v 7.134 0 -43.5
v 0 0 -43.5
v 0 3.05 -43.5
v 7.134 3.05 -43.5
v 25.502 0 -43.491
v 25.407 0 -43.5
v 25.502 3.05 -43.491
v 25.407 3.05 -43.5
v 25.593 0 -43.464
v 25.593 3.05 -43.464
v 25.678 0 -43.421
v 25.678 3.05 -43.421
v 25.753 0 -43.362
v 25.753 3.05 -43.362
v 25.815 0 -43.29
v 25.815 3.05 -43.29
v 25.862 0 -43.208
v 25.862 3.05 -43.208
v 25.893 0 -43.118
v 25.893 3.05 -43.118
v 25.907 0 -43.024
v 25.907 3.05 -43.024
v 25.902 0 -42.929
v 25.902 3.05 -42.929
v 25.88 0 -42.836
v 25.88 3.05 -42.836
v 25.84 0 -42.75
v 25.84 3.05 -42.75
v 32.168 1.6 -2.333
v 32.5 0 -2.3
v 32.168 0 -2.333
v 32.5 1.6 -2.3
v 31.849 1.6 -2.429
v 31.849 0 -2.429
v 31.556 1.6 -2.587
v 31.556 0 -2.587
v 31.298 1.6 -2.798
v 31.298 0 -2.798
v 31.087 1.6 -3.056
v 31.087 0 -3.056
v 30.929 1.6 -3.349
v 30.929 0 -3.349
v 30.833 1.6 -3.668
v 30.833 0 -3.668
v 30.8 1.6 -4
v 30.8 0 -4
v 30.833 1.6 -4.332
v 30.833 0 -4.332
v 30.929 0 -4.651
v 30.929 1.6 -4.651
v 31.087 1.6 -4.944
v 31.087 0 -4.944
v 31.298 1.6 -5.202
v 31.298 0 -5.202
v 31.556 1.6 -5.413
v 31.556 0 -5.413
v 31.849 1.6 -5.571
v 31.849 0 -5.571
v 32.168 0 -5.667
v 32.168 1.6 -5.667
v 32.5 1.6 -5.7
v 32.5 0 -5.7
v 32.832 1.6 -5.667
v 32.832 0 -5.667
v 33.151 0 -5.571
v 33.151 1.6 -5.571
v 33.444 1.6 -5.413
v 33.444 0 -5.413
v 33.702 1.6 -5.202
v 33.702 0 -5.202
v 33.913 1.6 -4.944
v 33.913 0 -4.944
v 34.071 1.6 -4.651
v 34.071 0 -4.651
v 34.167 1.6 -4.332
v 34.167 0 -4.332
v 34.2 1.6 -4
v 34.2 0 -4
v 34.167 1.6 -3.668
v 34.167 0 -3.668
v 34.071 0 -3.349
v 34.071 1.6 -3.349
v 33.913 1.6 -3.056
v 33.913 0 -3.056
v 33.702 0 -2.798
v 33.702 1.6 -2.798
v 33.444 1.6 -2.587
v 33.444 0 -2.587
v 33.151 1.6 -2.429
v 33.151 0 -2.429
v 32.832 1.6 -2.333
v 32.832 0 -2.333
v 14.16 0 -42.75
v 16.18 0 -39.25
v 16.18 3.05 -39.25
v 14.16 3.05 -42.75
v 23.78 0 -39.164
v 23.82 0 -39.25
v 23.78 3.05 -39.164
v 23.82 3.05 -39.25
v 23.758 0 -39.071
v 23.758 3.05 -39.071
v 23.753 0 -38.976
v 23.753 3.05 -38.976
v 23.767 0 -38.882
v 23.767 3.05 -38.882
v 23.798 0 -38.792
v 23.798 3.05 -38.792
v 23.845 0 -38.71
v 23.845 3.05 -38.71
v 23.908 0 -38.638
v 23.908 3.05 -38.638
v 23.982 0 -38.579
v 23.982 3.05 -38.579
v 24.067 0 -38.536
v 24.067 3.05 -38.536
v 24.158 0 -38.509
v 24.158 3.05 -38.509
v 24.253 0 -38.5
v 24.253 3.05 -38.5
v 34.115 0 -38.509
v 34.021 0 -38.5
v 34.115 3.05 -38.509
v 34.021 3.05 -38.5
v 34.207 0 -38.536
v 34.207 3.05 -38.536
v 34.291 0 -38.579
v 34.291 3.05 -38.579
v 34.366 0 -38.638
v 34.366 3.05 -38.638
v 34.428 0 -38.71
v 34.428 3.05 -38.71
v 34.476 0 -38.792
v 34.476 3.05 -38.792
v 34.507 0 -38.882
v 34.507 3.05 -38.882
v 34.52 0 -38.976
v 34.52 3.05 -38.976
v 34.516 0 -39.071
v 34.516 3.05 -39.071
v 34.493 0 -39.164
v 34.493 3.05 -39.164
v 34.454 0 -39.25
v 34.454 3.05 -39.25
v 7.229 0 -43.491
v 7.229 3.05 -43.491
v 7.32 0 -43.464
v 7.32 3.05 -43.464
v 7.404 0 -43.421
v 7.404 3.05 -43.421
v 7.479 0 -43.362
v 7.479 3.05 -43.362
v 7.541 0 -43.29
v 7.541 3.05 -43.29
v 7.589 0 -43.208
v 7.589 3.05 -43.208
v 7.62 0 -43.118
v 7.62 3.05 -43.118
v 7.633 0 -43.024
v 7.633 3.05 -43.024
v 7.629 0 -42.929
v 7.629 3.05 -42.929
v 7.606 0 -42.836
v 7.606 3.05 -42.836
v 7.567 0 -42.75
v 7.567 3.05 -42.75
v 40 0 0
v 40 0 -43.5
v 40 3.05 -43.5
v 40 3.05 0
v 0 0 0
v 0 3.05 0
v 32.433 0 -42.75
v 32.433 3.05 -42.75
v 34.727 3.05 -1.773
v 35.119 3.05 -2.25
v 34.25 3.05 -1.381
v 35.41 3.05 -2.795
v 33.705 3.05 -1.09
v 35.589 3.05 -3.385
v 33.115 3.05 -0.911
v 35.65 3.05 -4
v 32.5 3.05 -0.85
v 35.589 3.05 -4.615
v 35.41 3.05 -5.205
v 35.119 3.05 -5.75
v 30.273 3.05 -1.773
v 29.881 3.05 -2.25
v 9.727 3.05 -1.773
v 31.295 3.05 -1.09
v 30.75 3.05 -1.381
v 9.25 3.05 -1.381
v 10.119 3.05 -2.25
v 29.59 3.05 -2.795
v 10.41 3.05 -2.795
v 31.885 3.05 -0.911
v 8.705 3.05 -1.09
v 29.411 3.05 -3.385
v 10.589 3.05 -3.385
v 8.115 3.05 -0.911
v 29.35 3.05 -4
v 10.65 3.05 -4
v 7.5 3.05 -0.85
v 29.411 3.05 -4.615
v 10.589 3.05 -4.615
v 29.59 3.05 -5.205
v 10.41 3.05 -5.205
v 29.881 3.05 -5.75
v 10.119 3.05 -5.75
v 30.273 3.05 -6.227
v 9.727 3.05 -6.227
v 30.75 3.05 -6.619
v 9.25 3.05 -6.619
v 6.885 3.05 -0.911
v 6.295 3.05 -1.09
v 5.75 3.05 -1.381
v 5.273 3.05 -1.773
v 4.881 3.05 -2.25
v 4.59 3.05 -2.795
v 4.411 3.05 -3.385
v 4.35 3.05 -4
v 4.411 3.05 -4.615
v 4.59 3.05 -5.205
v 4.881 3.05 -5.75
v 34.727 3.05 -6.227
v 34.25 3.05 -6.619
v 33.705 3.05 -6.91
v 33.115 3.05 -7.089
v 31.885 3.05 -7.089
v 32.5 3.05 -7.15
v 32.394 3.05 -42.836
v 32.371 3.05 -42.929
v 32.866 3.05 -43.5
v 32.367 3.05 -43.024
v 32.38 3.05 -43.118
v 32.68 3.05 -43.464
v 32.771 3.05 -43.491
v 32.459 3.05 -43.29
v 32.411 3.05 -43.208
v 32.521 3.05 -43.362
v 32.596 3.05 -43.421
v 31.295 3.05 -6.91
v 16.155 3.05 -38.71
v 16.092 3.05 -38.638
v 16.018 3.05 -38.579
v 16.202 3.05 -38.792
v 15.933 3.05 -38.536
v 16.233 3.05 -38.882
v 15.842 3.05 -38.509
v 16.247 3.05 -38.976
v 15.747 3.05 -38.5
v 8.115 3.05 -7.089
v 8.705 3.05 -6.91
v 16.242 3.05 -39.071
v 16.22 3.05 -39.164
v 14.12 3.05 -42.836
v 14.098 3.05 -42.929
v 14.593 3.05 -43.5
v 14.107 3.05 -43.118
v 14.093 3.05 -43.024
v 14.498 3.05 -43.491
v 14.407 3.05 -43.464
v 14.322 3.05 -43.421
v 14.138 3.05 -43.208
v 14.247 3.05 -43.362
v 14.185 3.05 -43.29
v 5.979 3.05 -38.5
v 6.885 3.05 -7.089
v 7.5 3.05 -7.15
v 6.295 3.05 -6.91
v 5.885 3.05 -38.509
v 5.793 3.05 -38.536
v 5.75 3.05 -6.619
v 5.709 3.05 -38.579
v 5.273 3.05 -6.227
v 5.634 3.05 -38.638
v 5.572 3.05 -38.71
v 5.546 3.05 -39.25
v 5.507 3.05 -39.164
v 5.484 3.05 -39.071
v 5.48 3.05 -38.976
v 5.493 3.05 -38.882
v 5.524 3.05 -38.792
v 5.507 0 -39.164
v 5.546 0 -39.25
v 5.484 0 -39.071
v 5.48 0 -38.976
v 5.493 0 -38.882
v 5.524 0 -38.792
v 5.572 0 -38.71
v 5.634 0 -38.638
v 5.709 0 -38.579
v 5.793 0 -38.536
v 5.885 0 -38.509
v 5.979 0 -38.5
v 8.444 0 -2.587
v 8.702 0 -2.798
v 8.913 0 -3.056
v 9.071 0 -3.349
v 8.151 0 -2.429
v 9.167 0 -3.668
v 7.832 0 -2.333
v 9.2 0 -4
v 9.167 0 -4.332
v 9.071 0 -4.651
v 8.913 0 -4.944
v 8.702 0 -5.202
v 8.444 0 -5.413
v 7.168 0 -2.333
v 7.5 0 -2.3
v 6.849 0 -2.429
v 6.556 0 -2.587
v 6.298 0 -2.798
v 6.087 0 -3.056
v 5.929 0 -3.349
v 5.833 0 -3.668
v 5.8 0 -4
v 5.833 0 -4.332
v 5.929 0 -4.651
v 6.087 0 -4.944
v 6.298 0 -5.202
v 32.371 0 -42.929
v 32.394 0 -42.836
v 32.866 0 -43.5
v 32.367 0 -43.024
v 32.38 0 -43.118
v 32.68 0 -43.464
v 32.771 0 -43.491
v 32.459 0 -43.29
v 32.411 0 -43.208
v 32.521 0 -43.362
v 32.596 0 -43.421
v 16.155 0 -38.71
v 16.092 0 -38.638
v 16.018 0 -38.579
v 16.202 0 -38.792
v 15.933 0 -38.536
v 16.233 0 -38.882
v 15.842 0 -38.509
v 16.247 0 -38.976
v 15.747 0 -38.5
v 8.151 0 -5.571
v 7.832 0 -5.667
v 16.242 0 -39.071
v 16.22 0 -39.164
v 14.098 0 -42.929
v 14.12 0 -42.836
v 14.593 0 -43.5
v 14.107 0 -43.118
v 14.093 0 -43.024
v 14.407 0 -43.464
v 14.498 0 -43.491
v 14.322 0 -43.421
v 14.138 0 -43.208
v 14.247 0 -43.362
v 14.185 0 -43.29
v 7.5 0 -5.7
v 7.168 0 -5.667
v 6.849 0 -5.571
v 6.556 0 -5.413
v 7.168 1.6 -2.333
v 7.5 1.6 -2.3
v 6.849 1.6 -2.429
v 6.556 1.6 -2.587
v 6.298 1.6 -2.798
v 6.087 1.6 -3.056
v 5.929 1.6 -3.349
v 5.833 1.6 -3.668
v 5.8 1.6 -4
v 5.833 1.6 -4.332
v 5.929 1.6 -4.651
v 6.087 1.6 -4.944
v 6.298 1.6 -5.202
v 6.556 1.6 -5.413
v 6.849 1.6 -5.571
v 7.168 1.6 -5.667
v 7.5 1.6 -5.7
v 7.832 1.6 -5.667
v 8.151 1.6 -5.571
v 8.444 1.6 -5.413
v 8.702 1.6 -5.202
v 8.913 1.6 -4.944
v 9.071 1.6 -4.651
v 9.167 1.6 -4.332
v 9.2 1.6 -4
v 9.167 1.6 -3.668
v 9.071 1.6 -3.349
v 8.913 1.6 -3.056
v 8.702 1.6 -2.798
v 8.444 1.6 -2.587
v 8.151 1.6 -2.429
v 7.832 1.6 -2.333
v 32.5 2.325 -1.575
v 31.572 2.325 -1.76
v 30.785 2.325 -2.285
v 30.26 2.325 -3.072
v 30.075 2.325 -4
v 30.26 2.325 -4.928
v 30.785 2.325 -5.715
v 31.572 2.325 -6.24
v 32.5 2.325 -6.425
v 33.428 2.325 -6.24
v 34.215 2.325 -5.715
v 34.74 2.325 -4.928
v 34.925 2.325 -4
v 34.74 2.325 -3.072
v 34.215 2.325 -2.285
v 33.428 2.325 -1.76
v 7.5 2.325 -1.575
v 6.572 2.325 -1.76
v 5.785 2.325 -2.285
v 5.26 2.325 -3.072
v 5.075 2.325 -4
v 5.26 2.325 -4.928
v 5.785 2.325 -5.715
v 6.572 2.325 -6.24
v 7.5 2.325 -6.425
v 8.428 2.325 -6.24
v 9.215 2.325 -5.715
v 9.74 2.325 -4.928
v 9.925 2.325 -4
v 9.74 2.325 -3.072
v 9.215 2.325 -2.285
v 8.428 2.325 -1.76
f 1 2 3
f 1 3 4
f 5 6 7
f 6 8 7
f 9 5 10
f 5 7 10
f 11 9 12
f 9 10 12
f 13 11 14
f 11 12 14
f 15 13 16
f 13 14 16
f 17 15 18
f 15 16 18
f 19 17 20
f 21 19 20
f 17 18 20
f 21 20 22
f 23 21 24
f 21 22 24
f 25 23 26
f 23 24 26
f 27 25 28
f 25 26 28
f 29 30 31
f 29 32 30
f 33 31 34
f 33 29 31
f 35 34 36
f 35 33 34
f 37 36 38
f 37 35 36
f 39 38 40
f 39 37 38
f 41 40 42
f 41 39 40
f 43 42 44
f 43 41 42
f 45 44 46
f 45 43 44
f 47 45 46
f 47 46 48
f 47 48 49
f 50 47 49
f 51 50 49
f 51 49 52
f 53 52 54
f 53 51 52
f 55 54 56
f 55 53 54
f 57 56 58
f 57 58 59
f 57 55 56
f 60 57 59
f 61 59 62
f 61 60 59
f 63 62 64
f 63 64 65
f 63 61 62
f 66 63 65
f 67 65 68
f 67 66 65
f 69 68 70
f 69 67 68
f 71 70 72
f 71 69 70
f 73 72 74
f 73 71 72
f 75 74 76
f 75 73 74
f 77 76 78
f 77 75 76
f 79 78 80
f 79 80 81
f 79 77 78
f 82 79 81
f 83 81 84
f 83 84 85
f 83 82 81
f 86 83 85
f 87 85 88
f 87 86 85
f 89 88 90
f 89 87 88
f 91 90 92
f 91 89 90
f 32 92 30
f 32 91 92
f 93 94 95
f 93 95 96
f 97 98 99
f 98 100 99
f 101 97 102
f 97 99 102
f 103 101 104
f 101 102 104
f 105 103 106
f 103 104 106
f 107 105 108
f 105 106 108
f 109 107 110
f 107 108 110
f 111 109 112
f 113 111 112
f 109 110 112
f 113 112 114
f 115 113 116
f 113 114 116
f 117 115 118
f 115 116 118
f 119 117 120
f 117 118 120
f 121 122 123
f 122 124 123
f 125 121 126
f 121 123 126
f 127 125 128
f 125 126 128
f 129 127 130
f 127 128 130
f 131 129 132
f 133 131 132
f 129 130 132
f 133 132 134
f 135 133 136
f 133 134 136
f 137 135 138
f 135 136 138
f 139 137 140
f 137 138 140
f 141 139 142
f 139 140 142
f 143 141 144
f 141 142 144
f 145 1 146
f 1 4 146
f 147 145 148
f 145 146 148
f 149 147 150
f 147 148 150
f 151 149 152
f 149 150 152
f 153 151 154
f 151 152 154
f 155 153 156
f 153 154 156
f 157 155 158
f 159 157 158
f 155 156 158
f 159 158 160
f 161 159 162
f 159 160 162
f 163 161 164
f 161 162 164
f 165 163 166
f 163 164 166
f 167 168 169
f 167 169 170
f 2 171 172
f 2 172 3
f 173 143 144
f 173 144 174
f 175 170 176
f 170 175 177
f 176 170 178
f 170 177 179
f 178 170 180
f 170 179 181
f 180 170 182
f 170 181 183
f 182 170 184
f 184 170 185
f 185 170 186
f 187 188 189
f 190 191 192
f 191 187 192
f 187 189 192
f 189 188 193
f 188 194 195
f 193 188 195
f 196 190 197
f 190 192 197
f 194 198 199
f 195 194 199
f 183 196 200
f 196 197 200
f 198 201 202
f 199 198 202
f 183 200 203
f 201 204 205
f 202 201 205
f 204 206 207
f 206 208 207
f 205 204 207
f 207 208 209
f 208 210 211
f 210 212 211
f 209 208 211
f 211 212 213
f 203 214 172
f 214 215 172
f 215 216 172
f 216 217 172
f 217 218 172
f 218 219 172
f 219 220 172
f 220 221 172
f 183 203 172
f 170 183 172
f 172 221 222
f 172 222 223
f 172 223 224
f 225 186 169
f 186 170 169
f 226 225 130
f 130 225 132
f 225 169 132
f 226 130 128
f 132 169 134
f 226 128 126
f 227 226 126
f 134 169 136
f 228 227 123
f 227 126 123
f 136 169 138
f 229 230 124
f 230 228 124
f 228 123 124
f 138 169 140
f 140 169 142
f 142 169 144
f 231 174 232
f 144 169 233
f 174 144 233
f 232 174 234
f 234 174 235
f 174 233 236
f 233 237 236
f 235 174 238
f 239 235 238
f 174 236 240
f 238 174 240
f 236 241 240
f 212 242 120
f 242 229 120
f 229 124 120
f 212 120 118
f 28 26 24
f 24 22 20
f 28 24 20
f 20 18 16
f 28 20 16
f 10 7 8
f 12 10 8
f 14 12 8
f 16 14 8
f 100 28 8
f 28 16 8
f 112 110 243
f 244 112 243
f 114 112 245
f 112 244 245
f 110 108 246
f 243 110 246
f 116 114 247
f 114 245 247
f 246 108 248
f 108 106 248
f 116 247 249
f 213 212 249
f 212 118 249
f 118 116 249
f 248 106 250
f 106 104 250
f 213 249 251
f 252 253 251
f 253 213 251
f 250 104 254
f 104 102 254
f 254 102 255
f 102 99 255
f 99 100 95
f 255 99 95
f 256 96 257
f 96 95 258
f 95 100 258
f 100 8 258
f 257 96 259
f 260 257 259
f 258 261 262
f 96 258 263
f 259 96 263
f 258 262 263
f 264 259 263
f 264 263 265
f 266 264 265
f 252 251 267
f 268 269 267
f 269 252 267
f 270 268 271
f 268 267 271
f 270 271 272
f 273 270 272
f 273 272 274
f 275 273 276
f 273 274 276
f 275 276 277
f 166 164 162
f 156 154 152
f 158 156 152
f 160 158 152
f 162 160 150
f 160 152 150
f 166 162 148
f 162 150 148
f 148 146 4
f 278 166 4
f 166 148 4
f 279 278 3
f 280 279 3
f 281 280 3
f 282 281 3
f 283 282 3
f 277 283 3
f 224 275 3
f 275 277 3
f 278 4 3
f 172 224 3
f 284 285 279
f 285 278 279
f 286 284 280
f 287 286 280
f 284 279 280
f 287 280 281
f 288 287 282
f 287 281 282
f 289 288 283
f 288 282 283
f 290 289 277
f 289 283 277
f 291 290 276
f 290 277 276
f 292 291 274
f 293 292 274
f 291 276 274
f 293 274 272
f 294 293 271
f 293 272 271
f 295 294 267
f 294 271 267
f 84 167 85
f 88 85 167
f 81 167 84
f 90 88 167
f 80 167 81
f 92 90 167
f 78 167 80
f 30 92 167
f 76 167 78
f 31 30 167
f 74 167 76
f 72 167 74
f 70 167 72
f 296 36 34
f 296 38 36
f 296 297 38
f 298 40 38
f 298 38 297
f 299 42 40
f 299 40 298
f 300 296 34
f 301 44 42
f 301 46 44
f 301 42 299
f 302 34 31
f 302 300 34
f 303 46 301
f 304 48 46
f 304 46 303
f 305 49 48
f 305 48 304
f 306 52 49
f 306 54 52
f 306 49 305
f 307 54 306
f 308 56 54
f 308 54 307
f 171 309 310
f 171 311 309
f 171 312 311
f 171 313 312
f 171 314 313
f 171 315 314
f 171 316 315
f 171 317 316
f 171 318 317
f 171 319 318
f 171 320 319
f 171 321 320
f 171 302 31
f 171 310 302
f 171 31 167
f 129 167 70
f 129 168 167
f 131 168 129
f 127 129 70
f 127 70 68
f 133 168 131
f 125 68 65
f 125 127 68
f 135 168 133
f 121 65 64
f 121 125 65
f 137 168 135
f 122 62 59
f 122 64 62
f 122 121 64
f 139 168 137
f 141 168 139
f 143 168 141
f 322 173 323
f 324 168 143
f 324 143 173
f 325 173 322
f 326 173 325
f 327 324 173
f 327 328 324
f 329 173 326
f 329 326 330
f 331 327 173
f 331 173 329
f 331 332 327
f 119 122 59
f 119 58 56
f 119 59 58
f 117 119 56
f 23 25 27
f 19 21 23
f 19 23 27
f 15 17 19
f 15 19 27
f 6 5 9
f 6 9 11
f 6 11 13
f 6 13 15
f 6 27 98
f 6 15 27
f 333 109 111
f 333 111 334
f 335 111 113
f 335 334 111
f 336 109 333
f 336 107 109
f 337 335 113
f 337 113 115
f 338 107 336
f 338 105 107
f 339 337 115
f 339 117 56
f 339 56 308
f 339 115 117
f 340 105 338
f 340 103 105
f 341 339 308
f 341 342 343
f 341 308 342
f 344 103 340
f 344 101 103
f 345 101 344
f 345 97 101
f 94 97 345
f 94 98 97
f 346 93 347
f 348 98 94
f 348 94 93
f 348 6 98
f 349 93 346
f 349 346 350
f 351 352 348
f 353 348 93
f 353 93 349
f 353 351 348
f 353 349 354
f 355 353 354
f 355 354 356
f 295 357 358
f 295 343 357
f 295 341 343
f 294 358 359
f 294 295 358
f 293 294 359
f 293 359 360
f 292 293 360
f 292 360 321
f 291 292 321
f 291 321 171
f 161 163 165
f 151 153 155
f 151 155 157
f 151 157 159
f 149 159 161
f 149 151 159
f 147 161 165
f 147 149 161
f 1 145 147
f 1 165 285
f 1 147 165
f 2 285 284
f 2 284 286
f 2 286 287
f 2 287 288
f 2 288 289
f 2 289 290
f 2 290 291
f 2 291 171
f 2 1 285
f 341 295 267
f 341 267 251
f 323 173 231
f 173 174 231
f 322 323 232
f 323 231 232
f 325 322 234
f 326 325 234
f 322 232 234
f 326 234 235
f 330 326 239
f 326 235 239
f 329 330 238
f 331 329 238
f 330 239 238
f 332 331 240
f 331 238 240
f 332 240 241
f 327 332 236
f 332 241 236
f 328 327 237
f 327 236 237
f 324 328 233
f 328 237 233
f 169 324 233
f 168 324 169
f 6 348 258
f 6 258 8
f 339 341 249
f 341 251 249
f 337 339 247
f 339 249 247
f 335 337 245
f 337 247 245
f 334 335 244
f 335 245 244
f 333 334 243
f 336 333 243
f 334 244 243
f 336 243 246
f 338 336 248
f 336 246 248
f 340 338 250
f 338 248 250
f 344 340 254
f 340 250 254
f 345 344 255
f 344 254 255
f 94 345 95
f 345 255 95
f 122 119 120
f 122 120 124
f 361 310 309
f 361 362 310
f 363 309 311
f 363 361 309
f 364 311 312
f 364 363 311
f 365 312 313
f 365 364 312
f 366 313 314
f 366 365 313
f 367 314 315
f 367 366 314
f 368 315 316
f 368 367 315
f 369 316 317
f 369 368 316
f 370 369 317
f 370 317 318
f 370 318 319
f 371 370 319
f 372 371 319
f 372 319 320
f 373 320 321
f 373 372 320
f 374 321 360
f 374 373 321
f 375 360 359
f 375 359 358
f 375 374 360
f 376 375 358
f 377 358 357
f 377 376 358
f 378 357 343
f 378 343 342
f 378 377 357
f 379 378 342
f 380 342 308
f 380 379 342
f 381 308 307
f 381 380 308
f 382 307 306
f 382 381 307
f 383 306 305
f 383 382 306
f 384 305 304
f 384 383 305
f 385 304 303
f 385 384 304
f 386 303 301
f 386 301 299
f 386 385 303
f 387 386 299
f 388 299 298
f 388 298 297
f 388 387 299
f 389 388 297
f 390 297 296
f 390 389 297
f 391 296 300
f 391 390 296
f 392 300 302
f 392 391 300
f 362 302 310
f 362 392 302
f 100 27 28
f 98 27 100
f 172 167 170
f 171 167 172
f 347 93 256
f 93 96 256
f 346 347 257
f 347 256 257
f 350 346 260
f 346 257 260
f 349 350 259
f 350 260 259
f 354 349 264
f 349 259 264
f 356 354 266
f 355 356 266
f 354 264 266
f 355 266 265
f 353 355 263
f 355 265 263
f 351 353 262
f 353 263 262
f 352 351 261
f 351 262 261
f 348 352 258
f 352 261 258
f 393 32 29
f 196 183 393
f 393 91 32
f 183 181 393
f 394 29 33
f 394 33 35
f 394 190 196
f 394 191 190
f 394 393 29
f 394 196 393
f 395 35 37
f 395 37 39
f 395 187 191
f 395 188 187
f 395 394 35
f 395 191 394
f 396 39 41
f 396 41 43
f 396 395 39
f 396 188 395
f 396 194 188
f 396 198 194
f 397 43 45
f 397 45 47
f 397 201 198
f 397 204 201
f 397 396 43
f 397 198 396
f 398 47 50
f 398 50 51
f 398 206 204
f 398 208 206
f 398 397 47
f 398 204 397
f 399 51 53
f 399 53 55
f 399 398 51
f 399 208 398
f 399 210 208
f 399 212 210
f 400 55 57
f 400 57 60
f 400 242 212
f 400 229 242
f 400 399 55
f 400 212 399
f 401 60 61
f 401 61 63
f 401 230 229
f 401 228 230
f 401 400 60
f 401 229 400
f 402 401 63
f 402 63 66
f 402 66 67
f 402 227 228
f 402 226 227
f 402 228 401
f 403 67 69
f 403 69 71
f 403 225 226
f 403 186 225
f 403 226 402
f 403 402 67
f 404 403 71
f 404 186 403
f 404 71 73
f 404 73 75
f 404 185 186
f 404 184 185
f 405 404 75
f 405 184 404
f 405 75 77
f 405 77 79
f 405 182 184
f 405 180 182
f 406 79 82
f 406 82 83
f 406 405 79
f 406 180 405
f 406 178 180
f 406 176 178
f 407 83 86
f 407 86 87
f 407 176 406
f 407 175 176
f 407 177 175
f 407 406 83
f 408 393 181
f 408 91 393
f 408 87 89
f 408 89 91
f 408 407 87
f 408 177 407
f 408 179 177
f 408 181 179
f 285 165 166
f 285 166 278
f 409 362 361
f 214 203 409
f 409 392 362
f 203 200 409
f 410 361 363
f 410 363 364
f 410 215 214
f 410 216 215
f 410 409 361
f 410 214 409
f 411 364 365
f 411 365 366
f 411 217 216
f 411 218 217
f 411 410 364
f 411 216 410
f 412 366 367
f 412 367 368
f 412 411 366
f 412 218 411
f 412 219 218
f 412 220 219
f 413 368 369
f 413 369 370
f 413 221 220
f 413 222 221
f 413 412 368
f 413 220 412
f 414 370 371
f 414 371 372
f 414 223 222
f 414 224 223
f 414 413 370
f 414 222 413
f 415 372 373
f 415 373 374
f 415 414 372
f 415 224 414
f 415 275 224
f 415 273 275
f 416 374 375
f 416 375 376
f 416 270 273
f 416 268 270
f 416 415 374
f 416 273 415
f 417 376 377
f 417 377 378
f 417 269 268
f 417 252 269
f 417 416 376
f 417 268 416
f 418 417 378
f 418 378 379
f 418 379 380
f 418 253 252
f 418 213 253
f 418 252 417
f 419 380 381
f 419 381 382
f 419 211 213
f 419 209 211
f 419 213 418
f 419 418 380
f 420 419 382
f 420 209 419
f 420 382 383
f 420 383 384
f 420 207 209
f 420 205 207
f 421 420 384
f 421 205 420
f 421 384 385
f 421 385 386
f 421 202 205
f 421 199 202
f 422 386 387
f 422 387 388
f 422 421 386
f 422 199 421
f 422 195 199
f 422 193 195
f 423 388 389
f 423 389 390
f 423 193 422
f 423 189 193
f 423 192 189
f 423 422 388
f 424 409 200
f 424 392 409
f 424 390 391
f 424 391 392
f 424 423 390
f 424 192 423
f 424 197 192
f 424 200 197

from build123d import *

# Parameters (mm, degrees)
BOSS_EXTRUDE1_DEPTH                            = 3.05
FILLET3_R                                      = 0.5
CSK_FOR_M3_FLAT_HEAD_MACHINE_SCREW1_AT_2_COUNT = 2
CSK_FOR_M3_FLAT_HEAD_MACHINE_SCREW1_AT_2_PITCH = 25


with BuildPart() as part:
    # Sketch1 → Boss-Extrude1 (new body)
    with BuildSketch(Plane(origin=(0, 0, 0), x_dir=(1, 0, 0), z_dir=(0, 1, 0))):
        Polygon((0, 0), (0, 43.5), (8, 43.5), (5.113248654, 38.5), (16.613248654, 38.5), (13.726497308, 43.5), (26.273502692, 43.5), (23.386751346, 38.5), (34.886751346, 38.5), (32, 43.5), (40, 43.5), (40, 0), align=None)
    extrude(amount=BOSS_EXTRUDE1_DEPTH)

    # Fillet3
    fillet3_edges = [part.edges().sort_by_distance(p)[0] for p in [
        (8, 1.525, -43.5),
        (5.113248654, 1.525, -38.5),
        (16.613248654, 1.525, -38.5),
        (13.726497308, 1.525, -43.5),
        (26.273502692, 1.525, -43.5),
        (23.386751346, 1.525, -38.5),
        (34.886751346, 1.525, -38.5),
        (32, 1.525, -43.5),
    ]]
    fillet(fillet3_edges, radius=FILLET3_R)

    # Sketch7 → CSK for M3 Flat Head Machine Screw1 (revolve, cut)
    with BuildSketch(Plane(origin=(7.5, 3.05, -4), x_dir=(0, 0, 1), z_dir=(1, 0, 0))):
        Polygon((0, 0), (0, 3.05), (1.7, 3.05), (1.7, 1.45), (3.15, 0), align=None)
    csk_for_m3_flat_head_machine_screw1 = revolve(axis=Axis((7.5, 9.4, -4), (0, -1, 0)), mode=Mode.SUBTRACT)

    # CSK for M3 Flat Head Machine Screw1 at 2: CSK for M3 Flat Head Machine Screw1 ×2
    with Locations(*[(i * CSK_FOR_M3_FLAT_HEAD_MACHINE_SCREW1_AT_2_PITCH, 0, 0) for i in range(1, CSK_FOR_M3_FLAT_HEAD_MACHINE_SCREW1_AT_2_COUNT)]):
        add(csk_for_m3_flat_head_machine_screw1, mode=Mode.SUBTRACT)


solid = part.part
